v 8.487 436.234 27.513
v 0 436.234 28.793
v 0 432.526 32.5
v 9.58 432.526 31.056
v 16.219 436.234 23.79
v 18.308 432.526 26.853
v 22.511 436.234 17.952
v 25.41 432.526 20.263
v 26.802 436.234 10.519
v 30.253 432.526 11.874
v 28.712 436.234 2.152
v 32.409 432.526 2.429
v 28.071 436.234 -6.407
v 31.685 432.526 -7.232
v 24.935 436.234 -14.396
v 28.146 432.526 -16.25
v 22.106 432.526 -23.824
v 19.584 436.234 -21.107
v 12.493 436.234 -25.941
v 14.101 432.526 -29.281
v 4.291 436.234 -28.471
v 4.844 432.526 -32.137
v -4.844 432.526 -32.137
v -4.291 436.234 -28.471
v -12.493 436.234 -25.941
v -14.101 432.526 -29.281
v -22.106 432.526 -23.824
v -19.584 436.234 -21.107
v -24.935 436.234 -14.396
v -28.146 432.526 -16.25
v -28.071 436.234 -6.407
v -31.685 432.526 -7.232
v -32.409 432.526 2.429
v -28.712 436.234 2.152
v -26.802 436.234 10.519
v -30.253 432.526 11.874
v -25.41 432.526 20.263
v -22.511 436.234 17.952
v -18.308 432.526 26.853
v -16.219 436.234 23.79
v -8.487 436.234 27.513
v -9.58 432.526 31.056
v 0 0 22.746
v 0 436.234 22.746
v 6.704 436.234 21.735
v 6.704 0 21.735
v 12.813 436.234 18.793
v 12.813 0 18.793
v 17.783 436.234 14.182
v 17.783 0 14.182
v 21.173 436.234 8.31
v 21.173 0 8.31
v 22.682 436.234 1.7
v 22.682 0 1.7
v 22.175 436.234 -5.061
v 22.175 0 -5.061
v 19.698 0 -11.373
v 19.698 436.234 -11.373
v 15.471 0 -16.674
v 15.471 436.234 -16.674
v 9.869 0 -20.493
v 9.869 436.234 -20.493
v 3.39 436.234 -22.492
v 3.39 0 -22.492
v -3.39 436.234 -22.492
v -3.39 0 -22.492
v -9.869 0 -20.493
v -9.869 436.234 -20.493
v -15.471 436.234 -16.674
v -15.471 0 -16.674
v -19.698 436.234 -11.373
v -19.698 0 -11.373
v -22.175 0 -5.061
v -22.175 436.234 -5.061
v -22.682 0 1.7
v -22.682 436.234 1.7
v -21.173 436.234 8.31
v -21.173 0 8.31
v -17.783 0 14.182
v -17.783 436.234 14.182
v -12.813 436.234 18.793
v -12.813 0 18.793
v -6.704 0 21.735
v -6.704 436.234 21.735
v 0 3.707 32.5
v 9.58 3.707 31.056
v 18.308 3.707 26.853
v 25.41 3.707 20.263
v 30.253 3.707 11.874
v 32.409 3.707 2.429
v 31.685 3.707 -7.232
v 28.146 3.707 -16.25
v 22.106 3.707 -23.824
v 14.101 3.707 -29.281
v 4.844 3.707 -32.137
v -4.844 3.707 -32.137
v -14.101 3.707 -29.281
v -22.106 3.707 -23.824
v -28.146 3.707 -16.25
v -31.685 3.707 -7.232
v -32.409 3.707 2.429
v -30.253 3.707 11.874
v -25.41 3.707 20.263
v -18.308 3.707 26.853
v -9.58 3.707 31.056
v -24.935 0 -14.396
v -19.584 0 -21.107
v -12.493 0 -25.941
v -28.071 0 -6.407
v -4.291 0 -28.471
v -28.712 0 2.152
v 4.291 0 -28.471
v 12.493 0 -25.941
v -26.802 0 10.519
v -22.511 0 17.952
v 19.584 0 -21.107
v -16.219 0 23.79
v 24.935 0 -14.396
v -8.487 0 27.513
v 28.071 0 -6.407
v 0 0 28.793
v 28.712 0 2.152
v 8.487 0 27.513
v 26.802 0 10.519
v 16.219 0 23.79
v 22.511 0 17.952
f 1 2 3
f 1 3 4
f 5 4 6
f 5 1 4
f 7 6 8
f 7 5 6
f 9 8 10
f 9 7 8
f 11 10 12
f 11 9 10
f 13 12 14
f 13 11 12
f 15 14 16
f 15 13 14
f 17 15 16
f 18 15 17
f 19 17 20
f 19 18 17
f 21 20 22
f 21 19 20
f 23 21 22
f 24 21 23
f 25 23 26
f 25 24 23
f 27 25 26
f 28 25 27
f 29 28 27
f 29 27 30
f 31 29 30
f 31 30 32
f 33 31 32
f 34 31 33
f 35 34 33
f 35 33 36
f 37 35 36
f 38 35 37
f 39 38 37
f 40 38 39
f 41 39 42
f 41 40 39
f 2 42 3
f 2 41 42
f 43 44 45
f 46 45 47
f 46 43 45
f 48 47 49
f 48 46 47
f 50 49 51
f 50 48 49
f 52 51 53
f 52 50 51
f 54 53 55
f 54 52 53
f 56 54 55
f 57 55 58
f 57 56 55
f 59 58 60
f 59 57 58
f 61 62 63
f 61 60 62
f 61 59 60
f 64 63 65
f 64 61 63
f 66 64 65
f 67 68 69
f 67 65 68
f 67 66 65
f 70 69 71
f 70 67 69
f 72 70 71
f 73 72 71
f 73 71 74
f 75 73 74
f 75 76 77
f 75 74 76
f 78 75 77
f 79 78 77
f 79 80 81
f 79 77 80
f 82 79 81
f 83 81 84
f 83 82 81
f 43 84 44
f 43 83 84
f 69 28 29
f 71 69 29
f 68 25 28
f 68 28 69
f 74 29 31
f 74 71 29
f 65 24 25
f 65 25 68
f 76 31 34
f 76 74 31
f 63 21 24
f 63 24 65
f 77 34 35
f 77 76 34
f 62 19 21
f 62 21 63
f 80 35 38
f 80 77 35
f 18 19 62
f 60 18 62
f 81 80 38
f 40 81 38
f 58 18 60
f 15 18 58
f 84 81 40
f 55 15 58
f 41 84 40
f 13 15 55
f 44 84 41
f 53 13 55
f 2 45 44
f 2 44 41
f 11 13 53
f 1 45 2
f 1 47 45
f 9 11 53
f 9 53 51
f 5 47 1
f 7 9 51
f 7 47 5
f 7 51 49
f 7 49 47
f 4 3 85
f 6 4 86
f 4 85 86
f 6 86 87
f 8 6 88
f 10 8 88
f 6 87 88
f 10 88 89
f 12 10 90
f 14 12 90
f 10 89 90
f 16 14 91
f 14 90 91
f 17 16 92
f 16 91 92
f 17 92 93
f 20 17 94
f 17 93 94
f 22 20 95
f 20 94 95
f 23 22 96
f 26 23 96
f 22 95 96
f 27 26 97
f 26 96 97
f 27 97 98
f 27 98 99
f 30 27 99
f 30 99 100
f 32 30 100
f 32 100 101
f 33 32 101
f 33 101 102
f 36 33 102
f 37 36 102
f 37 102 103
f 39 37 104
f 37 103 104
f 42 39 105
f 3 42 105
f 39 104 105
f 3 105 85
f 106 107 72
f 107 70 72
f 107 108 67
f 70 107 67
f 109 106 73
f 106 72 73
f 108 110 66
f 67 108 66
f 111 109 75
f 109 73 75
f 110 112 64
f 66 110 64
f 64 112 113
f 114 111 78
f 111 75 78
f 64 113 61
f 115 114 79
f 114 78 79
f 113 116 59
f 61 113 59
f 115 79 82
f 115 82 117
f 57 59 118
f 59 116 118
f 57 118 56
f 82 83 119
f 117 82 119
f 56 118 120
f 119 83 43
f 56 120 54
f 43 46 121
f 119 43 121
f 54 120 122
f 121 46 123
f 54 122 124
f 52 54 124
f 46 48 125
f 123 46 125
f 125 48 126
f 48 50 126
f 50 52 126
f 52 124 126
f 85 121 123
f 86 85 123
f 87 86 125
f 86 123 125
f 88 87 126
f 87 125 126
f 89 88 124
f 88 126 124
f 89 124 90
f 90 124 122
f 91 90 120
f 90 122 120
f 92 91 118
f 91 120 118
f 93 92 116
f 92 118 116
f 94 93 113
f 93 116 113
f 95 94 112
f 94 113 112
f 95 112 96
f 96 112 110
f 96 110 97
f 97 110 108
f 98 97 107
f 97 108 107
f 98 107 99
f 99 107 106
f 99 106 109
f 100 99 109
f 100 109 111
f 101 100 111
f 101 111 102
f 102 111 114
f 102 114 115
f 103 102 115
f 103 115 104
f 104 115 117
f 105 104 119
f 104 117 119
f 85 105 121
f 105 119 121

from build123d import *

# Parameters (mm, degrees)
SKETCH1_R           = 32.5
BOSS_EXTRUDE1_DEPTH = 436.233759187
SKETCH2_R           = 22.745655965
CUT_EXTRUDE1_DEPTH  = 439.648370172
CHAMFER1_SIZE       = 3.707340085


with BuildPart() as part:
    # Sketch1 → Boss-Extrude1 (new body)
    with BuildSketch(Plane(origin=(0, 0, 0), x_dir=(1, 0, 0), z_dir=(0, 1, 0))):
        Circle(SKETCH1_R)
    extrude(amount=BOSS_EXTRUDE1_DEPTH)

    # Sketch2 → Cut-Extrude1 (cut, through all)
    with BuildSketch(Plane(origin=(0, 0, 0), x_dir=(1, 0, 0), z_dir=(0, 1, 0))):
        Circle(SKETCH2_R)
    extrude(amount=CUT_EXTRUDE1_DEPTH, mode=Mode.SUBTRACT)

    # Chamfer1
    chamfer1_edges = [part.edges().sort_by_distance(p)[0] for p in [
        (-32.5, 436.233759187, 0),
        (-32.5, 0, 0),
    ]]
    chamfer(chamfer1_edges, length=CHAMFER1_SIZE)


solid = part.part
